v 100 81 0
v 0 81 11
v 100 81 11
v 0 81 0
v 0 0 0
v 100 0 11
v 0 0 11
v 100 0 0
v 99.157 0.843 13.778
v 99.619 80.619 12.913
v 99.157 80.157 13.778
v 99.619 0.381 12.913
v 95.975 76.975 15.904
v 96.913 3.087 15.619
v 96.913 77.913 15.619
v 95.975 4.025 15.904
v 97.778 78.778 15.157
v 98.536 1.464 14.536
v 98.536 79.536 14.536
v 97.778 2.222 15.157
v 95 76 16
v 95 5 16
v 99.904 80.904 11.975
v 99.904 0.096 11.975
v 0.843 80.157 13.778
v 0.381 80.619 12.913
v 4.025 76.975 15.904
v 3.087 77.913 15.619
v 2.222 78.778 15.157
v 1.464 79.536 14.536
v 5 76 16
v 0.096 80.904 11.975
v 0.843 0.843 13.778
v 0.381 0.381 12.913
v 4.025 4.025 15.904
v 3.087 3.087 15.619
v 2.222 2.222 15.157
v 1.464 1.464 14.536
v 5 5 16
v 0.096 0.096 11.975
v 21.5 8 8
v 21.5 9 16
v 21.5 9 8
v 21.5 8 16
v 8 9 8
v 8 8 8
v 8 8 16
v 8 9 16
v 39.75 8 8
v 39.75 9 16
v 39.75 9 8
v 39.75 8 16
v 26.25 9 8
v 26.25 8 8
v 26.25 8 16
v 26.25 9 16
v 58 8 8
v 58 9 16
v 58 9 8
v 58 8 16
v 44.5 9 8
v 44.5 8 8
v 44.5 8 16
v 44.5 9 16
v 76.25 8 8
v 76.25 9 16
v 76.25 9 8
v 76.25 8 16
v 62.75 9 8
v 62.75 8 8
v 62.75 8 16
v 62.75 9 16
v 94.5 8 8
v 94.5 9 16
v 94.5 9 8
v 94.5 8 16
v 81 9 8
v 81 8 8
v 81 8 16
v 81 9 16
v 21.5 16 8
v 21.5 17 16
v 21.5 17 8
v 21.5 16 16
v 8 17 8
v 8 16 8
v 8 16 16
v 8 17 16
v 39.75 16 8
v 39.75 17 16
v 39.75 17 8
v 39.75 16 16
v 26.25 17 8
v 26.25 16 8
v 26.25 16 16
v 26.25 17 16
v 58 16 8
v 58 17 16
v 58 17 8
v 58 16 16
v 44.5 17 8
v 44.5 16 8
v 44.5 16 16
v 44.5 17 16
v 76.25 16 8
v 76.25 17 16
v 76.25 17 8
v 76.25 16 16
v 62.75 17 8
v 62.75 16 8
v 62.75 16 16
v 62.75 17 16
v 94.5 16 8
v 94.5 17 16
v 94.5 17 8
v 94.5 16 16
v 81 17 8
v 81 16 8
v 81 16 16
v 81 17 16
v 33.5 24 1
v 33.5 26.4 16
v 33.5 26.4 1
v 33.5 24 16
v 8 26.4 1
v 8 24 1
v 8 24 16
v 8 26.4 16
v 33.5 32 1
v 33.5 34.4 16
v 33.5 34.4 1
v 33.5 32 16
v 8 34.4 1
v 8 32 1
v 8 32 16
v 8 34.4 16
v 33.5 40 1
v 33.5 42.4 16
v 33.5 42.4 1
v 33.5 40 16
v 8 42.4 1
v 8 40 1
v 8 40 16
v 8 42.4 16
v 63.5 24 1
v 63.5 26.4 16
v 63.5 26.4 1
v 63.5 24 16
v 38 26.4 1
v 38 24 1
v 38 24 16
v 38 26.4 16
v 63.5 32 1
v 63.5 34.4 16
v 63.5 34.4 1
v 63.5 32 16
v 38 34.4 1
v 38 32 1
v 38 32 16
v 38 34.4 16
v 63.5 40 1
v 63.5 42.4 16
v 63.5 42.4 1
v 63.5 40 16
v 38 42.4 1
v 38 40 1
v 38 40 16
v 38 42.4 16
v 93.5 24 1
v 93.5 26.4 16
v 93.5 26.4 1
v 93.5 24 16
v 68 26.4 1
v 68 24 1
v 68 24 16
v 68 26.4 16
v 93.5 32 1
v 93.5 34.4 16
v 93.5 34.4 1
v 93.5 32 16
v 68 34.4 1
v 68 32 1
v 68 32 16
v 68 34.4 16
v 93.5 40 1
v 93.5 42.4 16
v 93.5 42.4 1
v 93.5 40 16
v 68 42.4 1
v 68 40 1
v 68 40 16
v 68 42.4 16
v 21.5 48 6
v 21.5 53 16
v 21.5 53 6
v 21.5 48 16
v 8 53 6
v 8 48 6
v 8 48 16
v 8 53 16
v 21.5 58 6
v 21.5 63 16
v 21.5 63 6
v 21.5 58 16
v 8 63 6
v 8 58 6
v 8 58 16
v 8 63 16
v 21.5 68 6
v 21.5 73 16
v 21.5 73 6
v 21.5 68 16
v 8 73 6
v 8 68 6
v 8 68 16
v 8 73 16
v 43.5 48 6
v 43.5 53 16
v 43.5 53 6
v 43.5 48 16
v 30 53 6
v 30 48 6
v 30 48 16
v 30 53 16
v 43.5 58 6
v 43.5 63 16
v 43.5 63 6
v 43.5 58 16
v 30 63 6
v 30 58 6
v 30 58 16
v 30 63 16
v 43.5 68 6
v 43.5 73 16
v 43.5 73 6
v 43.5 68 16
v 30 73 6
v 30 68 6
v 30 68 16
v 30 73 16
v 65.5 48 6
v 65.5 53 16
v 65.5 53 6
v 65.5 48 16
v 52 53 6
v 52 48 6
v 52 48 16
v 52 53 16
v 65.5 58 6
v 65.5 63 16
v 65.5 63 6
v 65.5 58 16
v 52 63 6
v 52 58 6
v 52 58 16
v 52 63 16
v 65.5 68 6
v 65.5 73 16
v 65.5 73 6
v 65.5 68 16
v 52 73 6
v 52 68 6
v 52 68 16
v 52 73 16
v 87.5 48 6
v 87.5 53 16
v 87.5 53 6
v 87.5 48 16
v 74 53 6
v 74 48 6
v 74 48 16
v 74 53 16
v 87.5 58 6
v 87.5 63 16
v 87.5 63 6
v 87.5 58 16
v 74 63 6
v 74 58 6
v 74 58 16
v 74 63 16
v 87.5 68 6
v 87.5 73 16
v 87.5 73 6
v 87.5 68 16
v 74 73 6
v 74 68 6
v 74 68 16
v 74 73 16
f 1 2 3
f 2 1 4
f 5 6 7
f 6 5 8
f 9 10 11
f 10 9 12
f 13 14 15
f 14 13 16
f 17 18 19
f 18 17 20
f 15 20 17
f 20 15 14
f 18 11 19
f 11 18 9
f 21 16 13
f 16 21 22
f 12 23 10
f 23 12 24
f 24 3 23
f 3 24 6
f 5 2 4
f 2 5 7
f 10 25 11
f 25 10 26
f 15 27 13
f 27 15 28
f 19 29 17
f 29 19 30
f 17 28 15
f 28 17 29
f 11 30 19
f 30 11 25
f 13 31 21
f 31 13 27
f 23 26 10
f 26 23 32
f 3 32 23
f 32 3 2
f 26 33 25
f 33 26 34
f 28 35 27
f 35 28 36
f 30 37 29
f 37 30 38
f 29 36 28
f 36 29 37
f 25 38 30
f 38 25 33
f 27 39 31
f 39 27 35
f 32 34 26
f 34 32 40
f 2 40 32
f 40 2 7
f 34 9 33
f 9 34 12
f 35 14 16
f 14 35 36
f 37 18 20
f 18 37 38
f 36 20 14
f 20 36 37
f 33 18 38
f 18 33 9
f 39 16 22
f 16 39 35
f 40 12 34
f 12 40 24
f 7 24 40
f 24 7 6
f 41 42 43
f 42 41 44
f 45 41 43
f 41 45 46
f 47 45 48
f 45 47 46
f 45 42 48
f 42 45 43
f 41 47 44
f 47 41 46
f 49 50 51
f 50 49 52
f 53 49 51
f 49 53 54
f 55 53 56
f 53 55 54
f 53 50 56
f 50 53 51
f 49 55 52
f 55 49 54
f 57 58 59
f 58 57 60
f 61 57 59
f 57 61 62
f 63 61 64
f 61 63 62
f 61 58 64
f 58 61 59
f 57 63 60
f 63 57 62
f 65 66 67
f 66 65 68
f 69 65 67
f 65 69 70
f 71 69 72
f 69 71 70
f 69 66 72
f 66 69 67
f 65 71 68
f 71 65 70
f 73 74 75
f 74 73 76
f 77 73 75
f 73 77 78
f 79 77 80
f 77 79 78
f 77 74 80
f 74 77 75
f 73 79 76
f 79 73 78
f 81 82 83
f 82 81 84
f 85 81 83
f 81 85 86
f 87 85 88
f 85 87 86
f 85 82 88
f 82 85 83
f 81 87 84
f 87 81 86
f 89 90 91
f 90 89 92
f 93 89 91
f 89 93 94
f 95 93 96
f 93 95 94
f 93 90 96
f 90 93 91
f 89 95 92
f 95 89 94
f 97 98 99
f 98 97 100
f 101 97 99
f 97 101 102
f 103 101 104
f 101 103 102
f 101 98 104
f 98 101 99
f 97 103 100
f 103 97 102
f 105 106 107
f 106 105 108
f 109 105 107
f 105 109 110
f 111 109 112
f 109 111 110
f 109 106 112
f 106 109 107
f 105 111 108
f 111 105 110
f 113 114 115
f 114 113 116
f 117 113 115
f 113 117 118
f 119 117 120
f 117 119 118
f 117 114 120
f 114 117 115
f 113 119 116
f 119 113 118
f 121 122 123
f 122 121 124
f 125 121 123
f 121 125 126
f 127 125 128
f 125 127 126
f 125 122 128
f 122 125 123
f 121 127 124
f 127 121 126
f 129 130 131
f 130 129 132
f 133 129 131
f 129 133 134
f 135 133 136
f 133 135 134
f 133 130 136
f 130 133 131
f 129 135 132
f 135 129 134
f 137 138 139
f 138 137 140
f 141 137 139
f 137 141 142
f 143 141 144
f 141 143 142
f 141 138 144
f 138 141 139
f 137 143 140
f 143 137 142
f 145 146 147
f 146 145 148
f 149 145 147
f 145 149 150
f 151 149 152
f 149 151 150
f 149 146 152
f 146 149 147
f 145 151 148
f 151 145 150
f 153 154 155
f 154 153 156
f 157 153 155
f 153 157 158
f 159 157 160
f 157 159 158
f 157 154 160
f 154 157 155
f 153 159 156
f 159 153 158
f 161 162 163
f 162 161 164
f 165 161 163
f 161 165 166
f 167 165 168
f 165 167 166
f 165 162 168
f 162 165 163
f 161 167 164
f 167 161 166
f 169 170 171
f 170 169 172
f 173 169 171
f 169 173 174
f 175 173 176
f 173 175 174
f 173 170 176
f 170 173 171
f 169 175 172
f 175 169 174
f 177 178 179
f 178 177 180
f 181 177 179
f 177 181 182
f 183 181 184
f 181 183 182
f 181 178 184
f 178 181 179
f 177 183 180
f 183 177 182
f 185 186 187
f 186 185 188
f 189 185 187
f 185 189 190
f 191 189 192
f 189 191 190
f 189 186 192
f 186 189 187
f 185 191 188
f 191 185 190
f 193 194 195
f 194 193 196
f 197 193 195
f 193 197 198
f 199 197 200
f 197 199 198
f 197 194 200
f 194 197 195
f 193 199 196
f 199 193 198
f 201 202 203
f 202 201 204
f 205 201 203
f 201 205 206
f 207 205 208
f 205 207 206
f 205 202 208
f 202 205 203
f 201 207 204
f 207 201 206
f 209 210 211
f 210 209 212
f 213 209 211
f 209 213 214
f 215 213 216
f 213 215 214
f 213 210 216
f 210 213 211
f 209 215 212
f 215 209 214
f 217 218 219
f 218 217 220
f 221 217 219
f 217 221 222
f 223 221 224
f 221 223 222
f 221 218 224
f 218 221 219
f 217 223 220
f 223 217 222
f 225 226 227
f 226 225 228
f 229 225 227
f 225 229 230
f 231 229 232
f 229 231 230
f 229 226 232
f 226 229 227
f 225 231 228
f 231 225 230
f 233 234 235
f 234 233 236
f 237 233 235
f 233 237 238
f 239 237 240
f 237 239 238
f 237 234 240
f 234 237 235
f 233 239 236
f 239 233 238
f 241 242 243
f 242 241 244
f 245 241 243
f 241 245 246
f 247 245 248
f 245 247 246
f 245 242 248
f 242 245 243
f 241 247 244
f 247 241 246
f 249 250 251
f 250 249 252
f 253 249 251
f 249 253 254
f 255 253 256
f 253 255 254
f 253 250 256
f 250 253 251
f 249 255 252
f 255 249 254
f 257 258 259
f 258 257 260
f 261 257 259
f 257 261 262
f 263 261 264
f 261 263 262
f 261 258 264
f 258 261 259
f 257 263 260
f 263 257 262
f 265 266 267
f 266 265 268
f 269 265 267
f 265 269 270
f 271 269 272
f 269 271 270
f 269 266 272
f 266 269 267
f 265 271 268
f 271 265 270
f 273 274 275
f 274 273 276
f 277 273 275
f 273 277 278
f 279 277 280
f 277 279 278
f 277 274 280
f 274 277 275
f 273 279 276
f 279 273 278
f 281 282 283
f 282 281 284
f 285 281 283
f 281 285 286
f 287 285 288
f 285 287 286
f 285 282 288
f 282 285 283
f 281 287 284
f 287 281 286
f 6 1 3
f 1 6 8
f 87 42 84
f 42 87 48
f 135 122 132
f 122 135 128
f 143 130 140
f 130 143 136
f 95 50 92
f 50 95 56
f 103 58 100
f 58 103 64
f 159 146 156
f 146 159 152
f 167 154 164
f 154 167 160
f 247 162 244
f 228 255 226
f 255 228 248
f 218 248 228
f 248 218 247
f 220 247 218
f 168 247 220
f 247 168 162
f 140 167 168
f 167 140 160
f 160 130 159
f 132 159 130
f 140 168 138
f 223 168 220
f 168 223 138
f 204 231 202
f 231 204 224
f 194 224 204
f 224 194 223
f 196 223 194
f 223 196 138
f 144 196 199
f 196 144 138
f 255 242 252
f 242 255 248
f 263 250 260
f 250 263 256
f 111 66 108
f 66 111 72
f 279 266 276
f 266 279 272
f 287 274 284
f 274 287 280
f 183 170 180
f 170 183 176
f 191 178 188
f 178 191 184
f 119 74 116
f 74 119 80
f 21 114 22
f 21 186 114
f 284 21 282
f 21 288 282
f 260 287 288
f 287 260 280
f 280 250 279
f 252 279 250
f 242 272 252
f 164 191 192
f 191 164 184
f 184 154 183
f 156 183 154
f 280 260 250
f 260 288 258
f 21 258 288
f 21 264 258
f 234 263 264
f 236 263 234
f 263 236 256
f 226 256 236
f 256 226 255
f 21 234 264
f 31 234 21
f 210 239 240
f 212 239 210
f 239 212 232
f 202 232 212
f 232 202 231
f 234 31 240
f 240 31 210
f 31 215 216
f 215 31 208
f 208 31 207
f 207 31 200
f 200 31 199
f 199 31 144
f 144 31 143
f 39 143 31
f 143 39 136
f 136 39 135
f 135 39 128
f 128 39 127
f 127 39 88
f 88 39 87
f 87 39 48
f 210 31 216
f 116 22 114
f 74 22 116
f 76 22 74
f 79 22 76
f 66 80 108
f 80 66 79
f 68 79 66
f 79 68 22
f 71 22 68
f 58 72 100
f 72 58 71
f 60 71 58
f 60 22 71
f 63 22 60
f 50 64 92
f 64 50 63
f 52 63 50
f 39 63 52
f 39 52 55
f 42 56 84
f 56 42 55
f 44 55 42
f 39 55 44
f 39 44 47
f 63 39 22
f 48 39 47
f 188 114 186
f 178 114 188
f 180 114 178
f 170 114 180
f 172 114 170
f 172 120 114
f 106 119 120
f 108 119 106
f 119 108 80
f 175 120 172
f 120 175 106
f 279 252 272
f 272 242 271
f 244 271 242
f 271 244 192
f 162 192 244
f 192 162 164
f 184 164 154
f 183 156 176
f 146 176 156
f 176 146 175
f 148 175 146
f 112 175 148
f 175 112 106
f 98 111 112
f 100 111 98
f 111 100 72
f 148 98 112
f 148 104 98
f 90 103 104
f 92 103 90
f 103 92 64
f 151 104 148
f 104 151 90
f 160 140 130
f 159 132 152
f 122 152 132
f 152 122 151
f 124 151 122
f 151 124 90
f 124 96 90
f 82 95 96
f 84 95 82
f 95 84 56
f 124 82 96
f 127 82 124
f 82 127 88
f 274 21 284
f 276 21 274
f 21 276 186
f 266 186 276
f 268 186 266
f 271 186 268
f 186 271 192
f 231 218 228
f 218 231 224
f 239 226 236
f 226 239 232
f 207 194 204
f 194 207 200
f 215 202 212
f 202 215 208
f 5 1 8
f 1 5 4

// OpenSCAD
microsdw=13.5;
usbw=13.5;
sdw=25.5;
module micro_sdcard() {
    cube([microsdw,1,15]);
}

module sdcard() {
    cube([sdw,2.4,31]);
}

module usb() {
    cube([usbw,5,12]);
}

module rond_corner(deep) {
    difference() {
        cube([10,deep,10]);
        rotate([-90,0,0]) cylinder(deep, d=10,$fn=32);
    }
}


difference() {
    height=16;
    width=4*usbw+3*10+2*8;
    deep=5*8+2*10+5+2*8;
    cube([width,deep,height]);
    translate([width-5,0,height-5]) rond_corner(deep);
    translate([width,deep-5,height-5]) rotate([0,0,90]) rond_corner(width);
    translate([5,deep,height-5]) rotate([0,0,180]) rond_corner(deep);
    translate([0,5,height-5]) rotate([0,0,270]) rond_corner(width);
    spacemicro=(width-16-5*11)/4;
    for (i=[0:4]) {
        translate([8+(i*(11+spacemicro)),8,height-8]) micro_sdcard();
    }
    for (i=[0:4]) {
        translate([8+(i*(11+spacemicro)),16,height-8]) micro_sdcard();
    }
    space=(width-16-3*24)/2;
    for (i=[0:2]) {
        for (j=[0:2]) {
            translate([8+(i*(24+space)),24+(8*j),height-15]) sdcard();
        }
    }
    for (i=[0:3]) {
        for (j=[0:2]) {
            translate([8+(i*(12+10)),48+(10*j),height-10]) usb();
        }
    }

}
